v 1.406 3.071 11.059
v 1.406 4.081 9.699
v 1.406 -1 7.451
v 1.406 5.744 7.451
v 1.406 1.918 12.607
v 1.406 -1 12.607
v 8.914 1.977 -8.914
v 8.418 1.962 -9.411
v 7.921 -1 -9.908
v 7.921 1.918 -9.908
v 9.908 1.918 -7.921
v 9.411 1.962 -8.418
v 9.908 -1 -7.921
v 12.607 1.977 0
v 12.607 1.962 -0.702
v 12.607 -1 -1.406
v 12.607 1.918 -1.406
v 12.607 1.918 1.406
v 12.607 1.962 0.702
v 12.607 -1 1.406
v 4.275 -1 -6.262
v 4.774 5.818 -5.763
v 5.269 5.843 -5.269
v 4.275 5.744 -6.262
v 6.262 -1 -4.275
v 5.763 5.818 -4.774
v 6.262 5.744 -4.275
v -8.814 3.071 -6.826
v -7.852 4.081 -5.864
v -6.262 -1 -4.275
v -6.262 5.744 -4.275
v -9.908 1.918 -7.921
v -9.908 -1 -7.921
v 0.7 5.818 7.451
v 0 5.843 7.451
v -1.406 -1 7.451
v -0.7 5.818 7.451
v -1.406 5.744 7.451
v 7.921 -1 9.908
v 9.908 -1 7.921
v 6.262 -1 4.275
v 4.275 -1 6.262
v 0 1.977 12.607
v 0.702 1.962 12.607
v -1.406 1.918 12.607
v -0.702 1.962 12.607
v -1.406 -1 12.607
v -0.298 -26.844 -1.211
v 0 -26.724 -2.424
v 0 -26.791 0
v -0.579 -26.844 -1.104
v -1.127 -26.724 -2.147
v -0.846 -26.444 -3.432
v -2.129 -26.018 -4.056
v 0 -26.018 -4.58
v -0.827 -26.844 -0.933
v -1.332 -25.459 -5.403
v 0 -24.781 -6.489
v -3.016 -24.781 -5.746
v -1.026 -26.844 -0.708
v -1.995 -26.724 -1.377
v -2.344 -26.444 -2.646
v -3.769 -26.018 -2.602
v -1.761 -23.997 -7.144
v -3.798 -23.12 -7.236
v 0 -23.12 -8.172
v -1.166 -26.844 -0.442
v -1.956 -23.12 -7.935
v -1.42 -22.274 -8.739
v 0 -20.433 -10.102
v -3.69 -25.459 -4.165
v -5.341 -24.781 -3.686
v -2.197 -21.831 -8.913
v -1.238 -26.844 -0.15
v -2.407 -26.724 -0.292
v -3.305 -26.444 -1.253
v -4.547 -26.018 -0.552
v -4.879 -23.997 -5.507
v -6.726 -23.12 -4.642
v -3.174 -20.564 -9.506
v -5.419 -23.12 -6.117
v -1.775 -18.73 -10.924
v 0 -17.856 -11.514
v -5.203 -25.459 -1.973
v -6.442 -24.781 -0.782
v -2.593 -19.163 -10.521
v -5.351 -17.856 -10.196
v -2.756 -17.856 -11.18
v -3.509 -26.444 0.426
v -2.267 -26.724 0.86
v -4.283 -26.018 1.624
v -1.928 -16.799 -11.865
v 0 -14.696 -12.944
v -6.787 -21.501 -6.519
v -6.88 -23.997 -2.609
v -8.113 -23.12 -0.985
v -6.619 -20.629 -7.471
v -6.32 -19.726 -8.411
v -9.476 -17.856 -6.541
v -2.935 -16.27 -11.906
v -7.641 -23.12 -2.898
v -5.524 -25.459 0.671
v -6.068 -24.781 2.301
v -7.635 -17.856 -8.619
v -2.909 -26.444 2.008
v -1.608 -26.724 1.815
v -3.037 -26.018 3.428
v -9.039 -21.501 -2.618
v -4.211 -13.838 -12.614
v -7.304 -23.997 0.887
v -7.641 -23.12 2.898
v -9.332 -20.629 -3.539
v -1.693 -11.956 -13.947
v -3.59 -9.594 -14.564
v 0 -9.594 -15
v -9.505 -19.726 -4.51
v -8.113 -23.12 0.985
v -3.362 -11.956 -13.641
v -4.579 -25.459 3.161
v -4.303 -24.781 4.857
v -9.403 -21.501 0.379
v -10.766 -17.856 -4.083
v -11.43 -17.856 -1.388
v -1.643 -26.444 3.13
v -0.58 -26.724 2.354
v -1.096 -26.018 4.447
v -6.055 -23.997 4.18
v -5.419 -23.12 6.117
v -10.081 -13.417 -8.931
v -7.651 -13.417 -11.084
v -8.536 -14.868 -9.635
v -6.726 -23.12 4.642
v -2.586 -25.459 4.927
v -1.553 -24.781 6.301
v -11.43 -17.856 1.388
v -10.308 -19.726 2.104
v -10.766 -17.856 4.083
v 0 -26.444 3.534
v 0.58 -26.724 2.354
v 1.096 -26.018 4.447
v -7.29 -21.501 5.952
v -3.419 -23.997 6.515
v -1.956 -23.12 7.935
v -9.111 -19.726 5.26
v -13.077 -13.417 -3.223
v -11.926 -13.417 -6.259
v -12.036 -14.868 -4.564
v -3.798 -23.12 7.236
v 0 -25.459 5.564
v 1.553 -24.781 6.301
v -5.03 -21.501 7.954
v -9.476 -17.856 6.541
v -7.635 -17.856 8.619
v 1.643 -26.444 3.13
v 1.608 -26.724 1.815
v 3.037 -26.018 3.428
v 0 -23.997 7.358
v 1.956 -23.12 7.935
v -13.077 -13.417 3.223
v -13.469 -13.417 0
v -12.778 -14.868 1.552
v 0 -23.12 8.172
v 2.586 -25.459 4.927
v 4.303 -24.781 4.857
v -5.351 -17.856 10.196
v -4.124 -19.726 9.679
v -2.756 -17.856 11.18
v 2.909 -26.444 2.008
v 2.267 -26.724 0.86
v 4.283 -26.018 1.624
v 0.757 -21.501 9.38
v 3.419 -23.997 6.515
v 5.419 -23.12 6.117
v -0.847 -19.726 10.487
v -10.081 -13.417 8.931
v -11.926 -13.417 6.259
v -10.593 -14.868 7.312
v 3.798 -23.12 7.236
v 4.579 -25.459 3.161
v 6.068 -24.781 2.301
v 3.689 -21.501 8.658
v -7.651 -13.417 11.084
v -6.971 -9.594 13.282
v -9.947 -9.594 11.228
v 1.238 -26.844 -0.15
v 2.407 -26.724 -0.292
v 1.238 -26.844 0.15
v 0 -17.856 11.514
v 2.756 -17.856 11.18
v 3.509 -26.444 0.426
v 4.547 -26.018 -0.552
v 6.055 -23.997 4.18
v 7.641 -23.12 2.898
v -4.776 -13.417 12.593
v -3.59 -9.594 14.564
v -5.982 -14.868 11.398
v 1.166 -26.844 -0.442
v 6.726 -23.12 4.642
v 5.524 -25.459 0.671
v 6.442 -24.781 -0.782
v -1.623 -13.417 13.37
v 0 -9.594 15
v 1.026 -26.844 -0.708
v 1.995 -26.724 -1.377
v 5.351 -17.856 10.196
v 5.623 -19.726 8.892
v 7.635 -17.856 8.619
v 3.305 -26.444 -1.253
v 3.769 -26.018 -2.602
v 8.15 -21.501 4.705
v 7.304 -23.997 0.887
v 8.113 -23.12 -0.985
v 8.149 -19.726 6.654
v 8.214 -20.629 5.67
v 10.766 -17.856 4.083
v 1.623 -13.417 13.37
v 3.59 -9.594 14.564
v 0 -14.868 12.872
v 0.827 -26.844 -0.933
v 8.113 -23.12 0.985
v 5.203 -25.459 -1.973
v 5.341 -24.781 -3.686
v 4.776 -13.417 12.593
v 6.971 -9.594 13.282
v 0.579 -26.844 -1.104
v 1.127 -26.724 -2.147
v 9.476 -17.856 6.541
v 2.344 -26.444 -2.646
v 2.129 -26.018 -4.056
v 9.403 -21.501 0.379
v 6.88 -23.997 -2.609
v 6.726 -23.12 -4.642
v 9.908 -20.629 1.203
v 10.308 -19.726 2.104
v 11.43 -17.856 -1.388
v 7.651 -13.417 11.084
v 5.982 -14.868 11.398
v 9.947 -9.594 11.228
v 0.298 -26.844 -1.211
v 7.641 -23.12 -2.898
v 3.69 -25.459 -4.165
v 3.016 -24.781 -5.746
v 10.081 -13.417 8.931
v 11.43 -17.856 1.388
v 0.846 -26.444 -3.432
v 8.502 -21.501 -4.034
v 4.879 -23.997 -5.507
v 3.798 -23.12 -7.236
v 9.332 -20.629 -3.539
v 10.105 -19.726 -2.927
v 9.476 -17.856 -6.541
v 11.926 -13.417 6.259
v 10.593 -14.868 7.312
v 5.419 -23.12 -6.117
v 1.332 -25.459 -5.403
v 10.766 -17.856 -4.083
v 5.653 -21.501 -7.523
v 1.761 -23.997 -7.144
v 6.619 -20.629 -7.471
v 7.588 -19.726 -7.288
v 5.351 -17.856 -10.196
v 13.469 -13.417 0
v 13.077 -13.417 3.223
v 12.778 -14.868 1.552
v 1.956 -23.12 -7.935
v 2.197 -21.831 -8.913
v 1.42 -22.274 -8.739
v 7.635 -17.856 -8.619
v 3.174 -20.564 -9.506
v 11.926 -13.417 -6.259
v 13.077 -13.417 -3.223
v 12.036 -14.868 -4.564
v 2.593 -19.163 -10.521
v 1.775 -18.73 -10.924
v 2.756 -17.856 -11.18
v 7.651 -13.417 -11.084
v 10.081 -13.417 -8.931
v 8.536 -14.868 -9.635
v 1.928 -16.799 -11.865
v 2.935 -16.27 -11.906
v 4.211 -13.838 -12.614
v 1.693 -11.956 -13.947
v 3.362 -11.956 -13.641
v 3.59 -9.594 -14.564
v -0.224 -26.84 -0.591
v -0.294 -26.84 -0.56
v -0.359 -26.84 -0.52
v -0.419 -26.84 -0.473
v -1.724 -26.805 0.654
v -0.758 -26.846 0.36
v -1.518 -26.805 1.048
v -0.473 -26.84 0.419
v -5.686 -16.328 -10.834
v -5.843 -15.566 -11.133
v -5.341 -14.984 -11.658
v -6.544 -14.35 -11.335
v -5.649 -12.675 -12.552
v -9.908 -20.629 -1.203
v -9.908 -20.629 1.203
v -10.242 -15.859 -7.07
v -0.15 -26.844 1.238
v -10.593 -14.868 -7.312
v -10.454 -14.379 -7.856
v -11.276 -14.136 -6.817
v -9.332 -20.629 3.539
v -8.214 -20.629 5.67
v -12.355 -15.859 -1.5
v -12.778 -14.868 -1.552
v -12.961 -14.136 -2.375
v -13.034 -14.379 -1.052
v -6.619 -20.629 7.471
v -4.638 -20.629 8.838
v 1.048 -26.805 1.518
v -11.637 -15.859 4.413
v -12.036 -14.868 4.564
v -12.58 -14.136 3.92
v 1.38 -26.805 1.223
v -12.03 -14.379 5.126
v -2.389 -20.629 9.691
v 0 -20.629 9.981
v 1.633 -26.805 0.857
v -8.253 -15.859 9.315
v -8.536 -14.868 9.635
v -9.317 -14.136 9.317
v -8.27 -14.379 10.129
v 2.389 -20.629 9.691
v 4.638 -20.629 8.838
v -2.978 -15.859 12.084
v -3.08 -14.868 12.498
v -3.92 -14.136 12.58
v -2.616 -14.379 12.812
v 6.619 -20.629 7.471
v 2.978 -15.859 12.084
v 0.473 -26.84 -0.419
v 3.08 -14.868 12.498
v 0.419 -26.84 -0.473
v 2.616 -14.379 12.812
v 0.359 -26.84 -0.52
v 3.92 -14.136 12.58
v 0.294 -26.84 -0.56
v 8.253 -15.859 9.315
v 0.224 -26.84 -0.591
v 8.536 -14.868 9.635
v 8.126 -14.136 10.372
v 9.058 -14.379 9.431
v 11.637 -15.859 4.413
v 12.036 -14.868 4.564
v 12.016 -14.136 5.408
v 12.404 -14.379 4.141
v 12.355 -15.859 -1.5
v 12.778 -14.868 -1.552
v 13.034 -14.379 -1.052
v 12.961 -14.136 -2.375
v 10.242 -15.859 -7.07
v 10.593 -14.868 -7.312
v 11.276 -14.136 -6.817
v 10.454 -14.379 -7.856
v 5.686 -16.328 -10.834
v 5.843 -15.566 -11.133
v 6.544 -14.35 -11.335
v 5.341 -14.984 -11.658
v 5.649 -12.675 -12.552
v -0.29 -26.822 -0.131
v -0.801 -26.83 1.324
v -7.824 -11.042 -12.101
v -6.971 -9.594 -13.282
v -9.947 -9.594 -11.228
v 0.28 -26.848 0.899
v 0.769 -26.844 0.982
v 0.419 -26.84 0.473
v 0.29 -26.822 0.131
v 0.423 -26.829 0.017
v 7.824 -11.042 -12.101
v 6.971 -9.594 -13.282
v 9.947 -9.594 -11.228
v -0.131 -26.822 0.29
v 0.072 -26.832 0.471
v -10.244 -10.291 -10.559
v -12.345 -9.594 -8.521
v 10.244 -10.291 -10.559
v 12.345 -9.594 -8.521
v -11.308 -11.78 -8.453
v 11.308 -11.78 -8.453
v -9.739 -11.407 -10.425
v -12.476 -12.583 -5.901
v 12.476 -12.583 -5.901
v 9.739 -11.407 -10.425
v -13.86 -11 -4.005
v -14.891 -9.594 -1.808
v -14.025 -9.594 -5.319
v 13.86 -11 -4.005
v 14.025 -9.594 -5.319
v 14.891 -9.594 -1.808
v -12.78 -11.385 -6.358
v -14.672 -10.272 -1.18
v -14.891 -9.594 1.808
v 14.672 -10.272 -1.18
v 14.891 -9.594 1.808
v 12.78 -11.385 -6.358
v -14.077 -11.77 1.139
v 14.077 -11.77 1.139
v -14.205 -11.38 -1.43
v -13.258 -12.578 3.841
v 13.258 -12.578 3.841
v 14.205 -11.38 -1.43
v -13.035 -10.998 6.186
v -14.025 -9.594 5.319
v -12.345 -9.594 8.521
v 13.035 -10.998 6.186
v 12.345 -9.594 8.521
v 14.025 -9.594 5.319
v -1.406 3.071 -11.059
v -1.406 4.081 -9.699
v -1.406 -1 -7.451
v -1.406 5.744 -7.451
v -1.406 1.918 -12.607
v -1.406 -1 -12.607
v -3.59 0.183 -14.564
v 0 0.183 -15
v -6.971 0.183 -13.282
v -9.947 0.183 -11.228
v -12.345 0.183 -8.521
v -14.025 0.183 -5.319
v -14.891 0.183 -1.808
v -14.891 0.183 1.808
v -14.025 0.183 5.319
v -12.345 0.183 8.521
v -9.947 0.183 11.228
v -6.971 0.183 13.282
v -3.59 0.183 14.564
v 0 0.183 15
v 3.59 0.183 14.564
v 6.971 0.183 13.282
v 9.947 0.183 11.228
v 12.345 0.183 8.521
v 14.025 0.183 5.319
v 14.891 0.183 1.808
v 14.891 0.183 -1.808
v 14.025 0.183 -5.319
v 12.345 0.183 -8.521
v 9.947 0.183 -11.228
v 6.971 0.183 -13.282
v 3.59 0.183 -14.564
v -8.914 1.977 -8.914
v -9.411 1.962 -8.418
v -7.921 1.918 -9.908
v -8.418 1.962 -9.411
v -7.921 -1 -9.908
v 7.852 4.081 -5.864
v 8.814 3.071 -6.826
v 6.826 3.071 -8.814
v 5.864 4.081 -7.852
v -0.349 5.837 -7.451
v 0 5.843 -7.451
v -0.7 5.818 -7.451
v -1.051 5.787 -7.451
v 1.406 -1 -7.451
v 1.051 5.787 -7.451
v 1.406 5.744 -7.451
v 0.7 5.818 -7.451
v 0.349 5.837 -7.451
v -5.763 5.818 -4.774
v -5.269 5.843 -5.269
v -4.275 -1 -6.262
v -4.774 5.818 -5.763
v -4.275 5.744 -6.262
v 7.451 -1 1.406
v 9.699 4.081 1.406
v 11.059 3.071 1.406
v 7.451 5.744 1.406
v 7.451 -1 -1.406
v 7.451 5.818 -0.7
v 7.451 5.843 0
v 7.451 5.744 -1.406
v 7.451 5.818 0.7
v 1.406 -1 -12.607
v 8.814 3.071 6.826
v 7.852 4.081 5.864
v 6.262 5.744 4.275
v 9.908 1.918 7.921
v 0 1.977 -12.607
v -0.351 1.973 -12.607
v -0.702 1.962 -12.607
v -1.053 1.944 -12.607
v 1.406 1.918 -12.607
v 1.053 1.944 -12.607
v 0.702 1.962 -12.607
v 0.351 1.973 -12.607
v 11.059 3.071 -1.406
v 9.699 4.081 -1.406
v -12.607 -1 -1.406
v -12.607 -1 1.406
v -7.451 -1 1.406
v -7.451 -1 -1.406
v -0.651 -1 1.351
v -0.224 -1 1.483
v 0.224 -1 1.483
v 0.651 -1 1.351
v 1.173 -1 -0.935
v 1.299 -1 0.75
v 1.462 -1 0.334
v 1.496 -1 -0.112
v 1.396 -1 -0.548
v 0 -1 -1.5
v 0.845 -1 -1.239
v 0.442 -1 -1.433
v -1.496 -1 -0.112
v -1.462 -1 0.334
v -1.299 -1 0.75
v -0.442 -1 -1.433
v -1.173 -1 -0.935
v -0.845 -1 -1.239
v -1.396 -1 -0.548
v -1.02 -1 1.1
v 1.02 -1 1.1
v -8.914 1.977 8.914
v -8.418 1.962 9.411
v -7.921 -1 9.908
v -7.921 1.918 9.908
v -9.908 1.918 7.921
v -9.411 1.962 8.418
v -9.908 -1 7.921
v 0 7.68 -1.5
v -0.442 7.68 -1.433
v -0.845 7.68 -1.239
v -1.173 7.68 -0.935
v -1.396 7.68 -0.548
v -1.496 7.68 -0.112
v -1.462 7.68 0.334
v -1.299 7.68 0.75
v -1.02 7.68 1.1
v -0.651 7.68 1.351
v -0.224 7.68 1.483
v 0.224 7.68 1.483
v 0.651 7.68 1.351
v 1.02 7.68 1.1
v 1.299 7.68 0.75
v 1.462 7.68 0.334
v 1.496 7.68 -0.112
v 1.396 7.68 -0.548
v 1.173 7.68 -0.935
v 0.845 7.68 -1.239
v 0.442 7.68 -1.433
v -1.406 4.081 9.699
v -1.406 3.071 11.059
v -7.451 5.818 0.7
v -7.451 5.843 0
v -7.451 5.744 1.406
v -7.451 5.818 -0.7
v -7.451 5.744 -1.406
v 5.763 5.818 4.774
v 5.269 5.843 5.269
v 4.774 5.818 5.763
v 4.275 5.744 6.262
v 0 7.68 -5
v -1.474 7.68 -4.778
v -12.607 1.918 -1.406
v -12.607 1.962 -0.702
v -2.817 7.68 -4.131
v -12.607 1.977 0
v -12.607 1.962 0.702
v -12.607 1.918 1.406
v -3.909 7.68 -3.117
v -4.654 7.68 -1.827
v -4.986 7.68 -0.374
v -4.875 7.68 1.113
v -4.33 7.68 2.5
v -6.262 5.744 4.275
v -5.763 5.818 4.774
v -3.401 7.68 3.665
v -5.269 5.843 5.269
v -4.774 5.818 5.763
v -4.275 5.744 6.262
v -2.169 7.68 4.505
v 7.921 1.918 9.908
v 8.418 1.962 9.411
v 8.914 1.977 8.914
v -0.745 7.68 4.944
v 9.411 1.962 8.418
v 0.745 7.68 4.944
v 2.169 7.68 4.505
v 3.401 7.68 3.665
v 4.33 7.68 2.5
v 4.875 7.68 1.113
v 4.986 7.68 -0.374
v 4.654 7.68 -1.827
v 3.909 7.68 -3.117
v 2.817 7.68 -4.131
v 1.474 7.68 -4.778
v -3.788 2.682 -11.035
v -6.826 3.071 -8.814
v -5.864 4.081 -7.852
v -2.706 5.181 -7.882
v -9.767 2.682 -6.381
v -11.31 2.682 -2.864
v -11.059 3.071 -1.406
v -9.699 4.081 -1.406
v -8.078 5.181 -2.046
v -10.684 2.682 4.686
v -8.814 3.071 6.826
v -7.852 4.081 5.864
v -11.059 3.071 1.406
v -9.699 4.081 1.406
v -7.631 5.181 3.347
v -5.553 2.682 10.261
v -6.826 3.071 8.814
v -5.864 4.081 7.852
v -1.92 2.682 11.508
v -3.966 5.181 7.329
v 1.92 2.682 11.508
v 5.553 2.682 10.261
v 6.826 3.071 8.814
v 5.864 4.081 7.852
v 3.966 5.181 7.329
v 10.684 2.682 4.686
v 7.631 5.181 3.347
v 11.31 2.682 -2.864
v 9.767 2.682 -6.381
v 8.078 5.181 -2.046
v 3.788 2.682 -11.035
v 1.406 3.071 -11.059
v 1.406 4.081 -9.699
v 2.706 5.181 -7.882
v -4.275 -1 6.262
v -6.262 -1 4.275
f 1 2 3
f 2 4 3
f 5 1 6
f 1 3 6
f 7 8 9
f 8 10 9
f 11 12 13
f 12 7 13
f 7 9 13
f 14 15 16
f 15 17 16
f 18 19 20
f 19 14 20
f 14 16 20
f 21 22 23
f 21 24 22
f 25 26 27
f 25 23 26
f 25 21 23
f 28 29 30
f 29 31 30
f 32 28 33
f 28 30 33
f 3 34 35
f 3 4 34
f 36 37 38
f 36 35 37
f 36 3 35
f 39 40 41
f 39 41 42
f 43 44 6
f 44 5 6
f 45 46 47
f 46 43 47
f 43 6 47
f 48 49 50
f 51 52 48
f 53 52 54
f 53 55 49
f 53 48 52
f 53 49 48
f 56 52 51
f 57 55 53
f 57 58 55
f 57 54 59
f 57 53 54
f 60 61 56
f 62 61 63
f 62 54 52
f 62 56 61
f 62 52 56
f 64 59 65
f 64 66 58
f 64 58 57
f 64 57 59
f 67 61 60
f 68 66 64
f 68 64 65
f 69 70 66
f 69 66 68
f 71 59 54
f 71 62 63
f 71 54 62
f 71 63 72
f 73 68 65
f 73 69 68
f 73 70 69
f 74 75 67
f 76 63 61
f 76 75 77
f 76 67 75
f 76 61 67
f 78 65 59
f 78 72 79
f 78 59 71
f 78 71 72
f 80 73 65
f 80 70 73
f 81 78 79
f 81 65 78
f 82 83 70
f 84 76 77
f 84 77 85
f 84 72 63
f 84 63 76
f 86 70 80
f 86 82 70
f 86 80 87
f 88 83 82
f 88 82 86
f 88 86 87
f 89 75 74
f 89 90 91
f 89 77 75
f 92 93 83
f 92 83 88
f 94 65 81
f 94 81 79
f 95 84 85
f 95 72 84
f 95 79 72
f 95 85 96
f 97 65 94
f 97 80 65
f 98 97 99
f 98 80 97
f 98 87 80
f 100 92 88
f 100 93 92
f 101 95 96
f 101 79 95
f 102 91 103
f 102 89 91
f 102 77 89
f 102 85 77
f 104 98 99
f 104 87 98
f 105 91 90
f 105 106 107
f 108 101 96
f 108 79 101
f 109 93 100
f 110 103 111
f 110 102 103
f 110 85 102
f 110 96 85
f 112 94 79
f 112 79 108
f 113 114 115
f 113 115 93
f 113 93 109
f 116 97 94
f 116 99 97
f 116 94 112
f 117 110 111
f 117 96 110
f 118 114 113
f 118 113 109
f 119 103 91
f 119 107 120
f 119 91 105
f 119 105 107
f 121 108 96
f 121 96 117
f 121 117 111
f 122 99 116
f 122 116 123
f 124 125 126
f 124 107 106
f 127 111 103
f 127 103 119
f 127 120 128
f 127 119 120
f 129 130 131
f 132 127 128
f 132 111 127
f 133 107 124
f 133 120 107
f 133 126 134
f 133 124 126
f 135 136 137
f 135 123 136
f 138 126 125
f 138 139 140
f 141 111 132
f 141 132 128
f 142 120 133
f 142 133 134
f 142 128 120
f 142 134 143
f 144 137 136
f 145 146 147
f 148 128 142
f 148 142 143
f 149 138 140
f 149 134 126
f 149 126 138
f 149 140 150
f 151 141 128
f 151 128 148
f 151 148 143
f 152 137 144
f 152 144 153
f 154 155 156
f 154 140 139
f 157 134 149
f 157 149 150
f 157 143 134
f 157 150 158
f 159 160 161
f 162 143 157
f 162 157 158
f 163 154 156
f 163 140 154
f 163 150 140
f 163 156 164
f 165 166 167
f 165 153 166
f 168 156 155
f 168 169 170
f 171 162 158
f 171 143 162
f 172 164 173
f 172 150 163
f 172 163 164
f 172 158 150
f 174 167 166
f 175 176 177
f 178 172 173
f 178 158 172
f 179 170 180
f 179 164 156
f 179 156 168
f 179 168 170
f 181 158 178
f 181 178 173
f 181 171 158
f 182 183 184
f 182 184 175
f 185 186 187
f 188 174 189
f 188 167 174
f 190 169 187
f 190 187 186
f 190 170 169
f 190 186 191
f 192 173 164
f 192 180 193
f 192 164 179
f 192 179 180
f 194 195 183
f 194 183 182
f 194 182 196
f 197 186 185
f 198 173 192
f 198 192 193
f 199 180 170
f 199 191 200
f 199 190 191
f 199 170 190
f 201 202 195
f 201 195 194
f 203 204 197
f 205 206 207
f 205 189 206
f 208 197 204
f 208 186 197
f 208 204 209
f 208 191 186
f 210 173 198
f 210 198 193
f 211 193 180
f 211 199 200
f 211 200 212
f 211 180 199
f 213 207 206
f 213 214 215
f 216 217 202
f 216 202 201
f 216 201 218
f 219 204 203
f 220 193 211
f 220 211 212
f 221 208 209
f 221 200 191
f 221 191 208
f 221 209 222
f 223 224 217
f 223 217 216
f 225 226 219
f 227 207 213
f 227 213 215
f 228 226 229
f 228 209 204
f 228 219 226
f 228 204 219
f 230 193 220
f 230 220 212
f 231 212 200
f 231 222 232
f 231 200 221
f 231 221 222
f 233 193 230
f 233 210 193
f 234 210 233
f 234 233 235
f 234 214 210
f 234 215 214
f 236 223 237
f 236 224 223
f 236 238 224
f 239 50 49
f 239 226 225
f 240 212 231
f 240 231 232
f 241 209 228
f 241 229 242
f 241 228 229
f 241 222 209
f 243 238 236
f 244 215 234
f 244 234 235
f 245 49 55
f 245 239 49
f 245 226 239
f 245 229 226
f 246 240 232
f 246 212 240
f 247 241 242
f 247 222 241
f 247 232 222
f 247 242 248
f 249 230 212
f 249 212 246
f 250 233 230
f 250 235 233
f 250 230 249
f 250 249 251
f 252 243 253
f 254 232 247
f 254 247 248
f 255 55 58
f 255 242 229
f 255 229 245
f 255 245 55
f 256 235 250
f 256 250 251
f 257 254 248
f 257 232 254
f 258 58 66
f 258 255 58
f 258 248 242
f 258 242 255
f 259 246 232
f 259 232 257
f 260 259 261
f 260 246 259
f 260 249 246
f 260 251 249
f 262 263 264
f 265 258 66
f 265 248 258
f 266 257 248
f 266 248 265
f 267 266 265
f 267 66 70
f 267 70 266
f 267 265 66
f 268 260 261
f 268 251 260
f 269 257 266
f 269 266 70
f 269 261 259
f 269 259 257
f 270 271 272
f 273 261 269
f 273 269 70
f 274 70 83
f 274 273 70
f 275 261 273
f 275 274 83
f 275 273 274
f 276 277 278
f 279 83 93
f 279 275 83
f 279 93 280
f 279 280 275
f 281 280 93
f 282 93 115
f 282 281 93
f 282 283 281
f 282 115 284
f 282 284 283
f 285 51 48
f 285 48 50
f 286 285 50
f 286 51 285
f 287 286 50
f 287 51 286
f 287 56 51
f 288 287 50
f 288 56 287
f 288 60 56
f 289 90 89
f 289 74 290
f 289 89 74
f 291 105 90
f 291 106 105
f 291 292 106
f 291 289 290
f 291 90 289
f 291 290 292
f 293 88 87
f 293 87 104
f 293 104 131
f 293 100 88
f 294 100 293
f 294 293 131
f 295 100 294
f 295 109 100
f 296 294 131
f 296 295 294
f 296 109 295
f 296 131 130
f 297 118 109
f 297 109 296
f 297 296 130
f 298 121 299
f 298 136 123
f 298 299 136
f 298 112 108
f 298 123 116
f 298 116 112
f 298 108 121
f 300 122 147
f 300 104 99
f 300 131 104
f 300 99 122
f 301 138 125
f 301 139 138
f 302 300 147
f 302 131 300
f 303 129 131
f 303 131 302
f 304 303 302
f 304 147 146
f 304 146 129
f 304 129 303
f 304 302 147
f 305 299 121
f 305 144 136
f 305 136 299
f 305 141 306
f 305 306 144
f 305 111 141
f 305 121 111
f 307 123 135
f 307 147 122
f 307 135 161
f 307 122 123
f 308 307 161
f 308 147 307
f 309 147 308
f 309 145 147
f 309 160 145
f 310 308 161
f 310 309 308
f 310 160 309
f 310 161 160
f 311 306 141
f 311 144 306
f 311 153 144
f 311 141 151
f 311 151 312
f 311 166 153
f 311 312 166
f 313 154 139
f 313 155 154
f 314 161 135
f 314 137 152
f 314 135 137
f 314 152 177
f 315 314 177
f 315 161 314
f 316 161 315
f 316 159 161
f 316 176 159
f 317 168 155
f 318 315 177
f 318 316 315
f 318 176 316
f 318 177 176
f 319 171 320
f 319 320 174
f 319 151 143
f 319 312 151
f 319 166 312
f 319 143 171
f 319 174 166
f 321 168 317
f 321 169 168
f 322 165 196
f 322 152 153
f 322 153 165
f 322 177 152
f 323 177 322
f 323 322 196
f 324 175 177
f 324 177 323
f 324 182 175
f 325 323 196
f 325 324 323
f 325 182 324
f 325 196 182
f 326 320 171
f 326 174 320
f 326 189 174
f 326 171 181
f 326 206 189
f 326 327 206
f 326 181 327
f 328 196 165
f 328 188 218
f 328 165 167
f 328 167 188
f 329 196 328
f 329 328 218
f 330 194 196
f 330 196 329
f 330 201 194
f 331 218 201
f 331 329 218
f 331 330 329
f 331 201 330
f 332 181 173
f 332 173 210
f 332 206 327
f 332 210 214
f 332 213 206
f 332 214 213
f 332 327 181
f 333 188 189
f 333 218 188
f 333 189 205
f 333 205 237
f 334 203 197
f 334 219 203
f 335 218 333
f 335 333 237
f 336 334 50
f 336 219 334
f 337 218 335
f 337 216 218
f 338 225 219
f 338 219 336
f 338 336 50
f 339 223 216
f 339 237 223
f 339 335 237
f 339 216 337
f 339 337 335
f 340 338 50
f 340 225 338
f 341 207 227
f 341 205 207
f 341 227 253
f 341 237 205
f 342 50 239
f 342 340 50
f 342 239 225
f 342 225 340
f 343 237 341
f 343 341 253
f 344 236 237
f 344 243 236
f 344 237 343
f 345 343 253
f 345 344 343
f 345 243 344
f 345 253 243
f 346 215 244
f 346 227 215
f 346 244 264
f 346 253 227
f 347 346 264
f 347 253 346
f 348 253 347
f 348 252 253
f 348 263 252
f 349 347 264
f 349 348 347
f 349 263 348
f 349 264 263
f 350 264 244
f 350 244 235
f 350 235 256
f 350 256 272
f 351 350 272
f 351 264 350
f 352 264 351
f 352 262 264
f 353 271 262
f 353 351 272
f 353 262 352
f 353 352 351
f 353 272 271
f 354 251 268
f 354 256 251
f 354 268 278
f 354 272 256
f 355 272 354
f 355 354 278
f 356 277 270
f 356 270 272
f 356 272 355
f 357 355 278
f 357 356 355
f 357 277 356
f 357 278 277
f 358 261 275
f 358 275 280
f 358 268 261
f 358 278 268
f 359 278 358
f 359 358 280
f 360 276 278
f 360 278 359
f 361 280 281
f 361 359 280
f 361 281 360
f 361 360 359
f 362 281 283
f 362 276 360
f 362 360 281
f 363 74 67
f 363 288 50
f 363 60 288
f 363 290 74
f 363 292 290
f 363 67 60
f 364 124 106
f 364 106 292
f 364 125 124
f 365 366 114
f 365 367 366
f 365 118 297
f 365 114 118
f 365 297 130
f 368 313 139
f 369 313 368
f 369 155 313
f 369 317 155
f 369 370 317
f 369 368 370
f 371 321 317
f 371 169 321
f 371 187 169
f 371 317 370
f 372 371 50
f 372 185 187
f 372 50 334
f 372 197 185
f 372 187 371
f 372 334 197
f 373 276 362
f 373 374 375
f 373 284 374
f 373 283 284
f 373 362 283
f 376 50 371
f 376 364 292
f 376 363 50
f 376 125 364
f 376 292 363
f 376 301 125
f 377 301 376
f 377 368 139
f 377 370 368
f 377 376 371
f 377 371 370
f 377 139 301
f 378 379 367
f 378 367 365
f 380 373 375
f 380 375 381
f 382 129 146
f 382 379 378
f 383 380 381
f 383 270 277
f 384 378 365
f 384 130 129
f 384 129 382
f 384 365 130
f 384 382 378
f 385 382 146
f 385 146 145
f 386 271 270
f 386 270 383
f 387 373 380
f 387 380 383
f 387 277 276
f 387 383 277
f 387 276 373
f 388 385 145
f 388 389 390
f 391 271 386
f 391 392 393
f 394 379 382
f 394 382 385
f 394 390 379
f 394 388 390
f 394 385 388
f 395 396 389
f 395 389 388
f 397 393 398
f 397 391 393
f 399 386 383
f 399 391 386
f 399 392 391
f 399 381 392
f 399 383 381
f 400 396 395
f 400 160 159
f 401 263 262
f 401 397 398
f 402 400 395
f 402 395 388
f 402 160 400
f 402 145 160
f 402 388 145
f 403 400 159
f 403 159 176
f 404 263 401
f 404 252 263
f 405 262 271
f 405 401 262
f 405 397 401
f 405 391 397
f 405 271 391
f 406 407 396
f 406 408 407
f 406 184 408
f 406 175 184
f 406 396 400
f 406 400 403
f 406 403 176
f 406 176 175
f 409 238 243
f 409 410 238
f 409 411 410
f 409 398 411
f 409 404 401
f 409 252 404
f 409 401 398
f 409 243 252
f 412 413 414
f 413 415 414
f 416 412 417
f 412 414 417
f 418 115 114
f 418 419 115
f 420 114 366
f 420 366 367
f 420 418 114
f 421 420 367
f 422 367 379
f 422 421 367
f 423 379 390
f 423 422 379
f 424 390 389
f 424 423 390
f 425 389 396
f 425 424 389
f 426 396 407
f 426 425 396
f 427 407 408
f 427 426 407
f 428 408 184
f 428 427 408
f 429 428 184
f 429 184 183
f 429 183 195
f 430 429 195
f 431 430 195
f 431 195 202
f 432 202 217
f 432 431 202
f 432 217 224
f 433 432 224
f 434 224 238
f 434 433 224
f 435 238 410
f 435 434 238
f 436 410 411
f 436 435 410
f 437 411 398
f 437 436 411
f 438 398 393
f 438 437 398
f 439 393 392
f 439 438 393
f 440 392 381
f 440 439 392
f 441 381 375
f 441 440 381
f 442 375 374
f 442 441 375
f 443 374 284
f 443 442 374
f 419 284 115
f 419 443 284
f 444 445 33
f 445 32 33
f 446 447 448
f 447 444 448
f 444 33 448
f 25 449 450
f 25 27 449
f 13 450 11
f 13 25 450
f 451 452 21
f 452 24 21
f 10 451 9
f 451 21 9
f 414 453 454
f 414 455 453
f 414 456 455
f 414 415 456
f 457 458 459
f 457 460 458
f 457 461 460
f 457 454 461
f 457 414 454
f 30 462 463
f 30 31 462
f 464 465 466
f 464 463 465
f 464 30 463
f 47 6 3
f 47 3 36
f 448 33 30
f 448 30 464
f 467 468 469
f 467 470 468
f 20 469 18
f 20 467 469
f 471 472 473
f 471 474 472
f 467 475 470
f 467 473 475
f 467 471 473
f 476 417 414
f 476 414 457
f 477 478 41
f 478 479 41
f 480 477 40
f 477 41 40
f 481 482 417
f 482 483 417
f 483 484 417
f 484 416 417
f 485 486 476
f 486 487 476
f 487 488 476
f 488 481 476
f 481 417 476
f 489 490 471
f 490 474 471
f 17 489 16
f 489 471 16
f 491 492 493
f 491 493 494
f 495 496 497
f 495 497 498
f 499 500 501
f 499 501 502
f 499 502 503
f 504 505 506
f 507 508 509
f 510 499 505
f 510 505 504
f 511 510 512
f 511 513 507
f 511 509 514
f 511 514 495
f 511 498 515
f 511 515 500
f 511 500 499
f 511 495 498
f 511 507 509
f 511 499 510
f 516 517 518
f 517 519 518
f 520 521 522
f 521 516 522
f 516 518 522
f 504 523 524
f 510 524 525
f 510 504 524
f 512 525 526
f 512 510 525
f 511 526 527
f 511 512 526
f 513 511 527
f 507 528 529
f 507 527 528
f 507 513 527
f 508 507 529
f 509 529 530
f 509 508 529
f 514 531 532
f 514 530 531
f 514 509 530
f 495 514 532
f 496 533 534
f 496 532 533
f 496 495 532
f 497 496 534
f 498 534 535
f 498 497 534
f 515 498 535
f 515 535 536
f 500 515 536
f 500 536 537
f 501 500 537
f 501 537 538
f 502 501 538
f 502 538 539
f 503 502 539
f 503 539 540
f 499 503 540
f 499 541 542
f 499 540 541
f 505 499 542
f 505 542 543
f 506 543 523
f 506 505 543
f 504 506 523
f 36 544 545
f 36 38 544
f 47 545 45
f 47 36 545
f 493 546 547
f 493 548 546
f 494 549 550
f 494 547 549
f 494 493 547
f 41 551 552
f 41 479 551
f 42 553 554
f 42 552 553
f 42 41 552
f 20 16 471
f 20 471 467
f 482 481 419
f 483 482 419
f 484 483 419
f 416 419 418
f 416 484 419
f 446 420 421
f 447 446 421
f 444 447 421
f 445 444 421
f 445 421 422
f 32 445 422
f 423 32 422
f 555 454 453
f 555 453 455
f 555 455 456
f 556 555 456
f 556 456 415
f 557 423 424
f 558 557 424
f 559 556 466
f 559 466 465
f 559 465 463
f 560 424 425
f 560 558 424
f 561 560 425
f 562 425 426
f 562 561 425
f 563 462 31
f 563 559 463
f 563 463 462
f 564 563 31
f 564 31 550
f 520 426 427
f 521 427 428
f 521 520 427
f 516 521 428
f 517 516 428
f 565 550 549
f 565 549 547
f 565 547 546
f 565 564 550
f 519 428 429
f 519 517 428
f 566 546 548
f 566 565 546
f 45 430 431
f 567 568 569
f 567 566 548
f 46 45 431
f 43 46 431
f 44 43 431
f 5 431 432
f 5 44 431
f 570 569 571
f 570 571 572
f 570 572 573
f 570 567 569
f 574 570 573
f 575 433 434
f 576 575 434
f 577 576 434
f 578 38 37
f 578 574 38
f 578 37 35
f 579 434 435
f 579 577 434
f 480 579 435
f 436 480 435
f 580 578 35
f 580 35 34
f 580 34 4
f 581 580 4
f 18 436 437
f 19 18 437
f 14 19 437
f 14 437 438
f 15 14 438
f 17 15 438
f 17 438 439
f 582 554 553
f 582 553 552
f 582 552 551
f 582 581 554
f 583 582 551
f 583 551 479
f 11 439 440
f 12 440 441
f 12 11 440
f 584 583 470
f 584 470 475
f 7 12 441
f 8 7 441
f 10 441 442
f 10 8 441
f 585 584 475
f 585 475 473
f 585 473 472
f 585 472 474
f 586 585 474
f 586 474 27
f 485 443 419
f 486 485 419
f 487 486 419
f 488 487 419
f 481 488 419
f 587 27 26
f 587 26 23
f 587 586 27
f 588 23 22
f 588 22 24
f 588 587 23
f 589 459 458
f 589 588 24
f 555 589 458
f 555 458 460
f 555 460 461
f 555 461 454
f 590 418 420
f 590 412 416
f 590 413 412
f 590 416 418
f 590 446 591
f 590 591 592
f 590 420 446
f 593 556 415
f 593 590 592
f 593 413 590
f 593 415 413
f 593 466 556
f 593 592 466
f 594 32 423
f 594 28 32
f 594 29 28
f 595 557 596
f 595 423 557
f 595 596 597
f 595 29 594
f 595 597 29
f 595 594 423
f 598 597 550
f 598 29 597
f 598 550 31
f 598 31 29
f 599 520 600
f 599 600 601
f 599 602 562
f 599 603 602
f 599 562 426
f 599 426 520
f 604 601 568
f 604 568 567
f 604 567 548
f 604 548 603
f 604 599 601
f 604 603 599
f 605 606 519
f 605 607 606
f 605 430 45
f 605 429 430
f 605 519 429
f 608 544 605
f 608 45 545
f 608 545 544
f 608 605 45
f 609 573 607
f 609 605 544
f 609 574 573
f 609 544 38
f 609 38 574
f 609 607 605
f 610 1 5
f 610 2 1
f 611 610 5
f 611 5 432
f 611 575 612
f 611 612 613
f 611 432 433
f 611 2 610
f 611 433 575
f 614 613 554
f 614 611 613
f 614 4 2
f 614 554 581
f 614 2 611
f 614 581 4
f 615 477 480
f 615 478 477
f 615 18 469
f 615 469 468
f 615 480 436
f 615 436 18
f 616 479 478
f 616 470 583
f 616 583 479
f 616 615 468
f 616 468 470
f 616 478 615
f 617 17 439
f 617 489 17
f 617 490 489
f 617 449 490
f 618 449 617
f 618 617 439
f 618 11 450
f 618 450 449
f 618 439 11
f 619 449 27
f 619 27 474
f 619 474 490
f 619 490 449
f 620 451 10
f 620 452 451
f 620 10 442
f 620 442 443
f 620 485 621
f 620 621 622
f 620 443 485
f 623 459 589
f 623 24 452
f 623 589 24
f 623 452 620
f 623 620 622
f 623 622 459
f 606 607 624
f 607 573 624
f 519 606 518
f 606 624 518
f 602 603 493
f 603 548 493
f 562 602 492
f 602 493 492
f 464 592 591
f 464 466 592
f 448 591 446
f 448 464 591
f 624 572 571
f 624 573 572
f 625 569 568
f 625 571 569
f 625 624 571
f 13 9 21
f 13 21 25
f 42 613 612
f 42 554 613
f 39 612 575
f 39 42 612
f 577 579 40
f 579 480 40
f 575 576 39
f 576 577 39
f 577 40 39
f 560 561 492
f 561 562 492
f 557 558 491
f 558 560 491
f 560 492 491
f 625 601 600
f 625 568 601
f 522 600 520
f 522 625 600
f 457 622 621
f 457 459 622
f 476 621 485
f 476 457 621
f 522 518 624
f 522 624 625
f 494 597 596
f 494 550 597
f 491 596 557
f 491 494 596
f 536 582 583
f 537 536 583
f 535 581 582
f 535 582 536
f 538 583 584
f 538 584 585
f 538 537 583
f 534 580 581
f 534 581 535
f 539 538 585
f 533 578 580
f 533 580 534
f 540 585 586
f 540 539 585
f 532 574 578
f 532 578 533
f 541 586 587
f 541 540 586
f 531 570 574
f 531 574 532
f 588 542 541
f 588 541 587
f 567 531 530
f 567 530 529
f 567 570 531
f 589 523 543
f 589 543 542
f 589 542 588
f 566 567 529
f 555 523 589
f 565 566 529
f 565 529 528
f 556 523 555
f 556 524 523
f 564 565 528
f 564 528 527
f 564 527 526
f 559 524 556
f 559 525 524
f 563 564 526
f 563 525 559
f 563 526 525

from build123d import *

# Parameters (mm, degrees)
CUT_EXTRUDE_1_DEPTH      = 10
CUT_EXTRUDE_1_DEPTH_BACK = 1
SKETCH_3_R               = 1.5
CUT_EXTRUDE_START        = -1
SKETCH_4_W               = 2.811133726
SKETCH_4_H               = 5.156078578
CUT_EXTRUDE_2_DEPTH      = 36.217034404
PATTERN_CIRCULAR_1_COUNT = 8


with BuildPart() as part:
    # 草图1 → 旋转3 (revolve)
    with BuildSketch(Plane.XY, mode=Mode.PRIVATE) as revolve_3_sk:
        with BuildLine():
            Line((-15, 0.182551999), (-5, 7.680235811))
            Line((-5, 7.680235811), (0, 7.680235811))
            Line((0, 7.680235811), (0, -9.593702865))
            Line((0, -9.593702865), (0, -26.791420925))
            add(Edge.make_bspline(
                [(0, -26.791420925), (-8.890332256, -27.786972395), (-12.567592708, -15.34792859), (-15, -9.593702865)],
                knots=[0, 0, 0, 0, 1, 1, 1, 1], degree=3))
            Line((-15, -9.593702865), (-15, -6.069622936))
            Line((-15, -6.069622936), (-15, -3.569622936))
            Line((-15, -3.569622936), (-15, 0.182551999))
        make_face()
    revolve(revolve_3_sk.sketch.rotate(Axis((0, -9.593702865, 0), (0, 1, 0)), 270), axis=Axis((0, -9.593702865, 0), (0, 1, 0)))

    # 草图3 → 切除-拉伸1 (cut, two sides: drawn at the far end of the back side and taken through both)
    with BuildSketch(Plane(origin=(0, 0, 0), x_dir=(1, 0, 0), z_dir=(0, 1, 0)).offset(-CUT_EXTRUDE_1_DEPTH_BACK)):
        with Locations(Location((0, 0, 0), (0, 0, 90))):
            Circle(SKETCH_3_R)
    extrude(amount=CUT_EXTRUDE_1_DEPTH + CUT_EXTRUDE_1_DEPTH_BACK, mode=Mode.SUBTRACT)

    # 草图4 → 切除-拉伸2 (cut)
    with BuildSketch(Plane(origin=(0, 0, 0), x_dir=(1, 0, 0), z_dir=(0, 1, 0)).offset(CUT_EXTRUDE_START)):
        with Locations((0, 10.028828945)):
            Rectangle(SKETCH_4_W, SKETCH_4_H)
    cut_extrude_2 = extrude(amount=CUT_EXTRUDE_2_DEPTH, mode=Mode.SUBTRACT)

    # 阵列(圆周)1: 切除-拉伸2 ×8 about axis
    pattern_circular_1_axis = Axis((0, 0, 0), (0, 1, 0))
    for i in range(1, PATTERN_CIRCULAR_1_COUNT):
        add(cut_extrude_2.rotate(pattern_circular_1_axis, i * 360 / PATTERN_CIRCULAR_1_COUNT), mode=Mode.SUBTRACT)


solid = part.part
